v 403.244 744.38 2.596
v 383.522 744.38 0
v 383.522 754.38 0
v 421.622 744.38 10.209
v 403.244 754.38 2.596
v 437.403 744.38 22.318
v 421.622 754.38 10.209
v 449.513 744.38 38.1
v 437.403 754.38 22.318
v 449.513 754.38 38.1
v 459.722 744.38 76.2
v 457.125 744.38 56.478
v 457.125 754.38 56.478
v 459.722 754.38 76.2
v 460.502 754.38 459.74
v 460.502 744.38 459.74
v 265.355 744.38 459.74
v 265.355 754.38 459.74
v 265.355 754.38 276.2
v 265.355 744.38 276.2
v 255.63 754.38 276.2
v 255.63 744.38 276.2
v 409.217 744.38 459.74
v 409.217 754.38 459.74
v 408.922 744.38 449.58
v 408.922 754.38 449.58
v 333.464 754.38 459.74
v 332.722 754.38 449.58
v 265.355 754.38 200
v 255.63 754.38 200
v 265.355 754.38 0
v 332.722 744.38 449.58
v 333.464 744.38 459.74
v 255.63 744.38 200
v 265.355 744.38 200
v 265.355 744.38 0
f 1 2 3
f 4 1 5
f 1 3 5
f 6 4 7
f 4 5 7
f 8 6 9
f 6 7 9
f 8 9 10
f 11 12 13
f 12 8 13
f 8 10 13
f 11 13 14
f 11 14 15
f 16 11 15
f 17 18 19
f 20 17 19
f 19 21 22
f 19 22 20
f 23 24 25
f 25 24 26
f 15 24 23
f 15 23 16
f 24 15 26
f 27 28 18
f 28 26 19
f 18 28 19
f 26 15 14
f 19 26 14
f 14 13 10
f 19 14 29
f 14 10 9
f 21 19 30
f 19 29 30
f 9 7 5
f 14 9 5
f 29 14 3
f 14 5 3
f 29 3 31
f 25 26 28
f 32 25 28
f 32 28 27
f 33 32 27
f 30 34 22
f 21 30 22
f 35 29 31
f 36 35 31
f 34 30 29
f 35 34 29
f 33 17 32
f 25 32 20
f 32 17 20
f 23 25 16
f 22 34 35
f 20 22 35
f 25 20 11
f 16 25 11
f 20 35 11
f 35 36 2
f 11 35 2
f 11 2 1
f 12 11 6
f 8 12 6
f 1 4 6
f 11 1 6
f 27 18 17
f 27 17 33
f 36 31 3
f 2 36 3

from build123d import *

# Parameters (mm, degrees)
BOSS_EXTRUDE1_DEPTH = 459.74
SKETCH3_W           = 117.668752198
SKETCH3_H           = 459.74
CUT_EXTRUDE1_DEPTH  = 10
SKETCH4_W           = 9.725175386
SKETCH4_H           = 183.54
SKETCH4_H_2         = 200
CUT_EXTRUDE3_DEPTH  = 63


with BuildPart() as part:
    # Sketch1 → Boss-Extrude1 (new body)
    with BuildSketch(Plane.XY):
        Polygon((358.121789204, 754.380000017), (137.961261276, 754.380000017), (137.961261276, 744.380000017), (562.803601281, 744.380000017), (562.803601281, 754.380000017), align=None)
    extrude(amount=BOSS_EXTRUDE1_DEPTH)

    # Sketch3 → Cut-Extrude1 (cut)
    with BuildSketch(Plane.XZ.offset(-744.380000017)):
        with Locations((196.795637375, 229.87)):
            Rectangle(SKETCH3_W, SKETCH3_H)
    extrude(amount=-CUT_EXTRUDE1_DEPTH, mode=Mode.SUBTRACT)

    # Sketch4 → Cut-Extrude3 (cut)
    with BuildSketch(Plane(origin=(0, 754.380000017, 0), x_dir=(1, 0, 0), z_dir=(0, 1, 0))):
        with Locations((260.492601167, -367.97)):
            Rectangle(SKETCH4_W, SKETCH4_H)
        with Locations((260.492601167, -100)):
            Rectangle(SKETCH4_W, SKETCH4_H_2)
        with BuildLine():
            Line((333.464234552, -459.74), (369.761877542, -561.839328351))
            Line((369.761877542, -561.839328351), (604.247212907, -525.668487146))
            Line((604.247212907, -525.668487146), (681.481358703, 161.10923172))
            Line((681.481358703, 161.10923172), (358.740146189, 101.846462791))
            Line((358.740146189, 101.846462791), (383.521789204, 0))
            ThreePointArc((383.521789204, 0), (437.403325931, -22.318463274), (459.721789204, -76.2))
            Line((459.721789204, -76.2), (460.501916297, -459.74))
            Line((460.501916297, -459.74), (409.216807378, -459.74))
            Line((409.216807378, -459.74), (408.921789204, -449.58))
            Line((408.921789204, -449.58), (332.721789204, -449.58))
            Line((332.721789204, -449.58), (333.464234552, -459.74))
        make_face()
    extrude(amount=-CUT_EXTRUDE3_DEPTH, mode=Mode.SUBTRACT)


solid = part.part
